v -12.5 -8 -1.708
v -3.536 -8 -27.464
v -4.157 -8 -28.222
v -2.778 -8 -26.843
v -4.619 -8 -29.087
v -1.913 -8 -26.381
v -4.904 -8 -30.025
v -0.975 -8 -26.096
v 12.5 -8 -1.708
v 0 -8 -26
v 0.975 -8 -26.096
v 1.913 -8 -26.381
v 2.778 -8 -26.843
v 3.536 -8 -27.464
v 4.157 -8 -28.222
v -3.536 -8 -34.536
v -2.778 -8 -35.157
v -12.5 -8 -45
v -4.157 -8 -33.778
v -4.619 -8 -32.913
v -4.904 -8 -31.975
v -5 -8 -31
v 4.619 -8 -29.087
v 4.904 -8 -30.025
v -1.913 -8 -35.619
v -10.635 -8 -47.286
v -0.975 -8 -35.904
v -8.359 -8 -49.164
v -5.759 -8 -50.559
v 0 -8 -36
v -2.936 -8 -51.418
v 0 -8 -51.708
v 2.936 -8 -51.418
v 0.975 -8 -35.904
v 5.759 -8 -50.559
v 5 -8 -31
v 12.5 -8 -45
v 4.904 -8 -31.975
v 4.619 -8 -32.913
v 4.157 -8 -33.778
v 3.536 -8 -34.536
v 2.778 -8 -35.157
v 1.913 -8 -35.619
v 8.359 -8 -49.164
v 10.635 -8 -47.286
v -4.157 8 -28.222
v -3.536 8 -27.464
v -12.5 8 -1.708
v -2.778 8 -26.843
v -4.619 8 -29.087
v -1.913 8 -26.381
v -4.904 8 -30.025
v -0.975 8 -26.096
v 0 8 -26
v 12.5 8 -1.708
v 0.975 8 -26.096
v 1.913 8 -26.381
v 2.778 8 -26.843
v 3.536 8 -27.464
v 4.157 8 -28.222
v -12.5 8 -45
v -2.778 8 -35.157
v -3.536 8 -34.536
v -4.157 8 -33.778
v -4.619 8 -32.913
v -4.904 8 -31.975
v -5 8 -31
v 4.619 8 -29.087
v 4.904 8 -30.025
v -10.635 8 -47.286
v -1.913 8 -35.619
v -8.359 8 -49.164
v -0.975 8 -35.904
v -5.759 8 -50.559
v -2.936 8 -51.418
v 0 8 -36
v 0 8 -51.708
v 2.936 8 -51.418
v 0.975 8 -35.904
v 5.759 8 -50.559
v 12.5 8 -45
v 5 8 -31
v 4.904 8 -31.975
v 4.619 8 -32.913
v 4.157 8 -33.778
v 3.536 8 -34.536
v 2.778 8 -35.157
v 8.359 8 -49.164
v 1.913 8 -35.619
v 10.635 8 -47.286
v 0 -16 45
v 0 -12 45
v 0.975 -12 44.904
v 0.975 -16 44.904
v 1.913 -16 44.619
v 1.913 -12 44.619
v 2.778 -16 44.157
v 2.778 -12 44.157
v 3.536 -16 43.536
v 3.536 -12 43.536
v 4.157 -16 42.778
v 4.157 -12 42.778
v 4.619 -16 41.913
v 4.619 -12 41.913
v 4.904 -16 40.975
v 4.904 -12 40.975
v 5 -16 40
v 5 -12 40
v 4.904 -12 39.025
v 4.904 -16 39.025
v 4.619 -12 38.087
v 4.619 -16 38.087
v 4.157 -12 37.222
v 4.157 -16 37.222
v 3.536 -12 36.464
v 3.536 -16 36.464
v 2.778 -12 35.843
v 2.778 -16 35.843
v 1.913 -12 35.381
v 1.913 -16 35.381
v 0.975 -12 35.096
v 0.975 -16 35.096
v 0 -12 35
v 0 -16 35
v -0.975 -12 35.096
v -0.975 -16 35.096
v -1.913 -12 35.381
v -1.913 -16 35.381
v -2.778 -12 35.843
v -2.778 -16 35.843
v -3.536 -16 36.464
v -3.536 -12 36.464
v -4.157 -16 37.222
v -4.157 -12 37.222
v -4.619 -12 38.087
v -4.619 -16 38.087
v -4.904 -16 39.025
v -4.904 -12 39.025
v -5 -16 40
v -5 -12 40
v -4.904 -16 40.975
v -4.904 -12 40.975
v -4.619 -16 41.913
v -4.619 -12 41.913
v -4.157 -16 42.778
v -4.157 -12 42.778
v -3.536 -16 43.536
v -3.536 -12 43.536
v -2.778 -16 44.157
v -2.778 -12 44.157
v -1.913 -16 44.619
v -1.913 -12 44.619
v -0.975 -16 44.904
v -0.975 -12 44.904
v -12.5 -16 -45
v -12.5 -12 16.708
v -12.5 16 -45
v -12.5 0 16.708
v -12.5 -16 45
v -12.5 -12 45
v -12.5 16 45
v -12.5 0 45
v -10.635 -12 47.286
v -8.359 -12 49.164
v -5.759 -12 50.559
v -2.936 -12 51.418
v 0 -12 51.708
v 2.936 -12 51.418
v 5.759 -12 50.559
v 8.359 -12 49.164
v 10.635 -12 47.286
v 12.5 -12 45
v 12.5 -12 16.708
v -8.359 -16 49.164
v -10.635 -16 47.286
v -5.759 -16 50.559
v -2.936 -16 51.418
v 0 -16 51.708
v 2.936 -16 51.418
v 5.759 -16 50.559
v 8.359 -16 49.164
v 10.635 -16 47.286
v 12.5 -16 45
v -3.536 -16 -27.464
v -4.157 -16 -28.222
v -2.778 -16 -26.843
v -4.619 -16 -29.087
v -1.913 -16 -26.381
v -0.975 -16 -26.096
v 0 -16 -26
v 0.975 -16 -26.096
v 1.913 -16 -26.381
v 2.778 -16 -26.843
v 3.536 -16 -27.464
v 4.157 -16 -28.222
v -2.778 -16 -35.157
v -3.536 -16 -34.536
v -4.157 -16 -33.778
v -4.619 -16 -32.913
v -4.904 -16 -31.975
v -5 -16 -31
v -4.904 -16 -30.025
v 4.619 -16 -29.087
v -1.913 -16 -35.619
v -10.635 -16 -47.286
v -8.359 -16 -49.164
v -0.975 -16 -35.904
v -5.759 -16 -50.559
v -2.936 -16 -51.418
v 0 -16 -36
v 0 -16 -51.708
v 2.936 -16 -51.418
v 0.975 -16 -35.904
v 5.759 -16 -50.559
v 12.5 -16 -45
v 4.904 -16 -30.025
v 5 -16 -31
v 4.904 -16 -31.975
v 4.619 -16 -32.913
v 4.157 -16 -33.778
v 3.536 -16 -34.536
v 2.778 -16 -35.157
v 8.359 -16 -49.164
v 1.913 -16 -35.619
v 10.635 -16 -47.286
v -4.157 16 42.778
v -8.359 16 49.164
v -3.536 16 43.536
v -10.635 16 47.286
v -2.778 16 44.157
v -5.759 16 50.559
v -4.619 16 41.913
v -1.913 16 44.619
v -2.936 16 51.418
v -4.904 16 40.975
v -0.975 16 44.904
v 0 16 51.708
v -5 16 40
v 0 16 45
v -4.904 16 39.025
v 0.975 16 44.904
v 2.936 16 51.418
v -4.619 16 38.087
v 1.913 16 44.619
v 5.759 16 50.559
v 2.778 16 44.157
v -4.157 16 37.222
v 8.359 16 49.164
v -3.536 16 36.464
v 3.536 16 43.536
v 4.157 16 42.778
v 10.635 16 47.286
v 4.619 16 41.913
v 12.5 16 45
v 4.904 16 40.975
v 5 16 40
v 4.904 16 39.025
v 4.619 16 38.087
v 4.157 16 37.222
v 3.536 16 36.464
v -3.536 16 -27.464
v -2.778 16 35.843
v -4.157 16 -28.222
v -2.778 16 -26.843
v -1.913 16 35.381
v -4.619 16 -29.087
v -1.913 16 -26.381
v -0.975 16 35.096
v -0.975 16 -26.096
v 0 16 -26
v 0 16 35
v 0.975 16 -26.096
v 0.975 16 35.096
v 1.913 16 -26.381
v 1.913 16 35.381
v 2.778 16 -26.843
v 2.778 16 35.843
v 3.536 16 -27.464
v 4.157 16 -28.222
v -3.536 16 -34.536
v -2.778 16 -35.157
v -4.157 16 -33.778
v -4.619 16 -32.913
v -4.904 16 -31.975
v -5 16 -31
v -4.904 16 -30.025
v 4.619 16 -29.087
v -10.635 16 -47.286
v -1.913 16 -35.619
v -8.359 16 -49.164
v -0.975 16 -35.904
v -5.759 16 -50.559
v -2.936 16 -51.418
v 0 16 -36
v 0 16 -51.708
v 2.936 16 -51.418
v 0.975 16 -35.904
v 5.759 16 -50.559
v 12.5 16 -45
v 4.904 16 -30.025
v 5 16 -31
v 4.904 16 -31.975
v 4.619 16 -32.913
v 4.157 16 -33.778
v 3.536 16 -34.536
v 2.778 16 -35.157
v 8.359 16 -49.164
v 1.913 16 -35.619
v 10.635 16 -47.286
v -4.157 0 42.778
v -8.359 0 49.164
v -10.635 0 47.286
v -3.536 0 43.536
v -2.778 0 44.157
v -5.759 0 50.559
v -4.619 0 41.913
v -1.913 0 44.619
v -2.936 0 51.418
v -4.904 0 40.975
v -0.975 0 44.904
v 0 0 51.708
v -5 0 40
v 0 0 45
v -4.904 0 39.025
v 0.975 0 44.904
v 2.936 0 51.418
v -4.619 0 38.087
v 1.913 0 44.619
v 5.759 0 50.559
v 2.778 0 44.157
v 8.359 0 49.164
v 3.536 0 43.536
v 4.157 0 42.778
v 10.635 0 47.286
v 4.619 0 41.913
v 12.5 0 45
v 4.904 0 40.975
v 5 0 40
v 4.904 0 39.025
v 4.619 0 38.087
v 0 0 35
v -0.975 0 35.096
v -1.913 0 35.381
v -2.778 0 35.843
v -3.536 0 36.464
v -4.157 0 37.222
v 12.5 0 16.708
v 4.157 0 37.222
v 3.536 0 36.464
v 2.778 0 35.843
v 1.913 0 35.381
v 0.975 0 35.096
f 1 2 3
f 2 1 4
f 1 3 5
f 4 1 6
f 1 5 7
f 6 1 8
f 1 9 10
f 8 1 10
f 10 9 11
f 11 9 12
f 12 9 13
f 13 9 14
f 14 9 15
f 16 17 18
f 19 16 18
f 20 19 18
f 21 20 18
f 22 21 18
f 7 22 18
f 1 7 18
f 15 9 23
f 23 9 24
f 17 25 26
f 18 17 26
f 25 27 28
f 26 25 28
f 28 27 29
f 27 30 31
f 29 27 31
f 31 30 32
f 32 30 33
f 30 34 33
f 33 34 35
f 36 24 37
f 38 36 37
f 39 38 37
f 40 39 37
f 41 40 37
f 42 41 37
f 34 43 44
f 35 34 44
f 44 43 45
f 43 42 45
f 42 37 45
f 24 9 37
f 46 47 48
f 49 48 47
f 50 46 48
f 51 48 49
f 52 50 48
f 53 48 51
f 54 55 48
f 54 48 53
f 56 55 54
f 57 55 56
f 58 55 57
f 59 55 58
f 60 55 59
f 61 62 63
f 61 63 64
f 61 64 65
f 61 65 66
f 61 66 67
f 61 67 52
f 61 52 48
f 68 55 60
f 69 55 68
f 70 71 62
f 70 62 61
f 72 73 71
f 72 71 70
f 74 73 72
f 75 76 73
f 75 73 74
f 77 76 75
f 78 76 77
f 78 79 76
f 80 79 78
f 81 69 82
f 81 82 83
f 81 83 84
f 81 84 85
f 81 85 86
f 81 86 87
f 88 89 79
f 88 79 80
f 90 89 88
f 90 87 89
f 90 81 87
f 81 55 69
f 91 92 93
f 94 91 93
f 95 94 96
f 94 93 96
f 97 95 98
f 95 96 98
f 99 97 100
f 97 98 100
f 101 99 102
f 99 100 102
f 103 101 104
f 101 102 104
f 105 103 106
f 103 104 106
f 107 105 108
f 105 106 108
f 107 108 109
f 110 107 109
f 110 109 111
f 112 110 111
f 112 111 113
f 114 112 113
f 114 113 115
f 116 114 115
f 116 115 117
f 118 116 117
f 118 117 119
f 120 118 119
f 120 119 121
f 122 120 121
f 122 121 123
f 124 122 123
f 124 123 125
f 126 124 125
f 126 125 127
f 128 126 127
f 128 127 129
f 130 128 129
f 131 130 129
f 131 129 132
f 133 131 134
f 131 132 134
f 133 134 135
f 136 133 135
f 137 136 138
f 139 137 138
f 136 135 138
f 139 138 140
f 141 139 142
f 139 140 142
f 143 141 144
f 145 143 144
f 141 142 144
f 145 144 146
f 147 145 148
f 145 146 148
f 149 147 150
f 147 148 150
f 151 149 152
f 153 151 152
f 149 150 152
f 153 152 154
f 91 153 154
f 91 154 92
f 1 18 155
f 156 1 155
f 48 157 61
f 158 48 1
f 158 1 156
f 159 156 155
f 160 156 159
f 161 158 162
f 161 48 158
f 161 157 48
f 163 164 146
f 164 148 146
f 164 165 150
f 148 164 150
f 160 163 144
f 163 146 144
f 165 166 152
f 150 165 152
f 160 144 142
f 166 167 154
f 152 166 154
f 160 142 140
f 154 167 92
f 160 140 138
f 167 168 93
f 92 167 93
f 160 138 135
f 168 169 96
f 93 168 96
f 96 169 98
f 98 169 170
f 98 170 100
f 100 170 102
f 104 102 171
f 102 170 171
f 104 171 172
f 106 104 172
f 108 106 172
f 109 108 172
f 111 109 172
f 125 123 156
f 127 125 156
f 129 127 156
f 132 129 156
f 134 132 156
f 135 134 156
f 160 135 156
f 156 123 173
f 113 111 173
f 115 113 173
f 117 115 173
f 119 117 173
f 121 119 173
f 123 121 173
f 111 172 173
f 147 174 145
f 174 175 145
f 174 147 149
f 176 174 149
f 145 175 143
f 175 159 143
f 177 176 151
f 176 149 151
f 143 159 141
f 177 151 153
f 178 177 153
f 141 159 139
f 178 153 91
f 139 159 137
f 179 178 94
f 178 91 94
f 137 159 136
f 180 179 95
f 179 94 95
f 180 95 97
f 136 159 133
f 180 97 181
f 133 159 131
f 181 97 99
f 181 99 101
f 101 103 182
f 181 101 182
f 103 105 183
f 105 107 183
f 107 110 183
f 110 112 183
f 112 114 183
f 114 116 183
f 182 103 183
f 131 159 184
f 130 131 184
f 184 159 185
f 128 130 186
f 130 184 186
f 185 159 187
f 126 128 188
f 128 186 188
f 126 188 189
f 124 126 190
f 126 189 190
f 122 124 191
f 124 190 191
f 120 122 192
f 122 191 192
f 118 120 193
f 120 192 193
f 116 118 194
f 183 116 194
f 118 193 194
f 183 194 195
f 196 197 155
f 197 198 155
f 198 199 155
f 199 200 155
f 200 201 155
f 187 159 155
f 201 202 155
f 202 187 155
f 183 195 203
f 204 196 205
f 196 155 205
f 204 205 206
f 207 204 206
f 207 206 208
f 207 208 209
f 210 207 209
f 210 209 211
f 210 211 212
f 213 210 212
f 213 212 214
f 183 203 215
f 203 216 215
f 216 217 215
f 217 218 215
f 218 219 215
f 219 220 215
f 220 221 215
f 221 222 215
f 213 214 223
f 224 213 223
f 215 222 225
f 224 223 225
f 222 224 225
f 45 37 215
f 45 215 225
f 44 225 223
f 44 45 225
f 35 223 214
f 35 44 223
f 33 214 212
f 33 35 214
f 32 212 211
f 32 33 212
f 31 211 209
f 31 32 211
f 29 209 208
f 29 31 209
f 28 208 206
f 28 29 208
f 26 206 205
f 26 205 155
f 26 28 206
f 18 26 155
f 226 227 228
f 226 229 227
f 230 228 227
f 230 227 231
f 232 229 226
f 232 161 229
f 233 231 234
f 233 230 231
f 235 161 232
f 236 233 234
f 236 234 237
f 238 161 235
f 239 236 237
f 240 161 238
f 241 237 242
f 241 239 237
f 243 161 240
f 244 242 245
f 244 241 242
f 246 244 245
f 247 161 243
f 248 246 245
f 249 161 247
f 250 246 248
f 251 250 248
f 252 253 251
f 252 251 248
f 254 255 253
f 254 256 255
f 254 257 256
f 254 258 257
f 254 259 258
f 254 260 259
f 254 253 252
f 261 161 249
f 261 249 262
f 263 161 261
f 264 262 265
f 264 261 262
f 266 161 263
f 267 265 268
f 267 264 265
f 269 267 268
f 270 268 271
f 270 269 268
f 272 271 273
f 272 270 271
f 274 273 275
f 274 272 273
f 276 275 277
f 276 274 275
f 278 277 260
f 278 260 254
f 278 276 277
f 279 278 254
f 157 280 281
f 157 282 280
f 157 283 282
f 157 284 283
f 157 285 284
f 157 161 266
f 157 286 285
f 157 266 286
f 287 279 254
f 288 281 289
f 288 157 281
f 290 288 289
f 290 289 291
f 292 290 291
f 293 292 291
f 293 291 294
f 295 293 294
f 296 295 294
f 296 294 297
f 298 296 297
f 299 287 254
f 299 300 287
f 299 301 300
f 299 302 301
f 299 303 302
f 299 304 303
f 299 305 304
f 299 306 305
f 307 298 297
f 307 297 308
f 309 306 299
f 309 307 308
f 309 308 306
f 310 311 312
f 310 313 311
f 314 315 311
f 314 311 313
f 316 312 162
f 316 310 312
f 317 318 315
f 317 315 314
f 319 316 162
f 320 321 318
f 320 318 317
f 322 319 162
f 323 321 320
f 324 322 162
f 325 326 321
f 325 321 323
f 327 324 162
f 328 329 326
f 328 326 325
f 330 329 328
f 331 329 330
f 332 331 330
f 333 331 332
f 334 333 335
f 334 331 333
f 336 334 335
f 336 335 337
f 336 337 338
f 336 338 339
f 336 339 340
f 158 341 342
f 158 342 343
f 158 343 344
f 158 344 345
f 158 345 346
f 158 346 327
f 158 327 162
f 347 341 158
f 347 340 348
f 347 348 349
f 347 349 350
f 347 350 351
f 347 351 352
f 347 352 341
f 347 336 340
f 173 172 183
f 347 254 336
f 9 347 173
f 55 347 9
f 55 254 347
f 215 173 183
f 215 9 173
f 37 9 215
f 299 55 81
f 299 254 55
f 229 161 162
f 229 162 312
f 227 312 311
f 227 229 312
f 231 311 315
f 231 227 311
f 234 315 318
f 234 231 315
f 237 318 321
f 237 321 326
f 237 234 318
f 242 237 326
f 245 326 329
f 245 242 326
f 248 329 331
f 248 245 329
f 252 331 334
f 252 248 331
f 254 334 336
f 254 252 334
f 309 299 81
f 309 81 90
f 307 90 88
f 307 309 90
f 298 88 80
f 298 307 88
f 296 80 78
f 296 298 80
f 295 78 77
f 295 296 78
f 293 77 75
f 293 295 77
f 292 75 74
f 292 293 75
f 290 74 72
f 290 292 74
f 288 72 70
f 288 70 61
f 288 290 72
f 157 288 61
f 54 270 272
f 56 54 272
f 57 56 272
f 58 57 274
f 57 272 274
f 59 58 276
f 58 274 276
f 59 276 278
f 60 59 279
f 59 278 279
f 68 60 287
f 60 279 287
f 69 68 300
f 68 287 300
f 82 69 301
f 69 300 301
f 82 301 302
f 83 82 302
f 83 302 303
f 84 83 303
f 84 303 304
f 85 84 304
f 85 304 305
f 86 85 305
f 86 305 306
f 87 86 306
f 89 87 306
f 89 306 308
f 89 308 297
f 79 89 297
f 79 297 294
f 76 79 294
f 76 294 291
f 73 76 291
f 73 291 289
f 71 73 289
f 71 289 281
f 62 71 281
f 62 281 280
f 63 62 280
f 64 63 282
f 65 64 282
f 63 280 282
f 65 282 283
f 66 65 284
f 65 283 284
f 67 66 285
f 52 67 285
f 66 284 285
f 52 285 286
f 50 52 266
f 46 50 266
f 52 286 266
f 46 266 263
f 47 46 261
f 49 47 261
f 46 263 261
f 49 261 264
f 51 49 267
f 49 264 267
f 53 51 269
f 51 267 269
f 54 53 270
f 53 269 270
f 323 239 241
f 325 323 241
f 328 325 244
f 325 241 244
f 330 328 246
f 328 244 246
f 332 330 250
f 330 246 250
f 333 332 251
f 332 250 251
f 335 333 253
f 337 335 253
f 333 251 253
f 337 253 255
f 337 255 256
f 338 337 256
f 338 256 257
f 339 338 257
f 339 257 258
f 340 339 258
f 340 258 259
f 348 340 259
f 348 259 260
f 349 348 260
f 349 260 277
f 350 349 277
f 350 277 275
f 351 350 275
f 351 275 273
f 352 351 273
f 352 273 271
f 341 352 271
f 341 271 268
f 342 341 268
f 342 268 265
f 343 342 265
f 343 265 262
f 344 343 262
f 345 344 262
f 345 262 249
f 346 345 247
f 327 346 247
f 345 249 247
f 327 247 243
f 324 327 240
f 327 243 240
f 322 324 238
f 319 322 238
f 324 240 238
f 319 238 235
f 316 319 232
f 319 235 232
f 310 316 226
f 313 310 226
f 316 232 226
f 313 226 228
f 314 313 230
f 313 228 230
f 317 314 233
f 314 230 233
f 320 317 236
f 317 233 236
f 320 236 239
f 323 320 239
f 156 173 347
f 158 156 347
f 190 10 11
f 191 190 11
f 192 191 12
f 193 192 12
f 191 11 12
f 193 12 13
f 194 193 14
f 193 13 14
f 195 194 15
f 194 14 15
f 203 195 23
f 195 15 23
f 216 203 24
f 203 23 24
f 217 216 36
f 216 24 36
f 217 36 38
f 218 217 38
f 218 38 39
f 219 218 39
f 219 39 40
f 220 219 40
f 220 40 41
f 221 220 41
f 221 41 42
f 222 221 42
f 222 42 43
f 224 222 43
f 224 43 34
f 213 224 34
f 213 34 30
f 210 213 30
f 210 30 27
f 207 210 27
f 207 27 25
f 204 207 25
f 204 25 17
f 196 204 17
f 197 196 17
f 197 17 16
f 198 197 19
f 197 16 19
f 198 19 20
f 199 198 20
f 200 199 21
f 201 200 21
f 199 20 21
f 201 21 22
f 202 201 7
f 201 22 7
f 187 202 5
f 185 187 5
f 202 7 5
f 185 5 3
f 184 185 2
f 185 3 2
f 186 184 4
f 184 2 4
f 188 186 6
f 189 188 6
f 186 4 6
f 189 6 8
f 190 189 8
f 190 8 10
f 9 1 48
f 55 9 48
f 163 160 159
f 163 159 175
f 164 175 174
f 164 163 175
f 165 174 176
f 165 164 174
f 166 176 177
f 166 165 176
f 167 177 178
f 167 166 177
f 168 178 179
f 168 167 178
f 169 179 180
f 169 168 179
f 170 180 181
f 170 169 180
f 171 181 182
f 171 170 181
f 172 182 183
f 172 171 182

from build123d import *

# Parameters (mm, degrees)
EXTRUDE_1_DEPTH     = 16
SKETCH_2_W          = 56.583123952
SKETCH_2_H          = 12
CUT_EXTRUDE_1_DEPTH = 60.621829584
SKETCH_3_W          = 86.583123952
SKETCH_3_H          = 16
CUT_EXTRUDE_2_DEPTH = 60.621829584
SKETCH_4_R          = 5
CUT_EXTRUDE_3_DEPTH = 63.080693963


with BuildPart() as part:
    # 草图1 → 凸台-拉伸1 (new, symmetric)
    with BuildSketch(Plane(origin=(0, 0, 0), x_dir=(1, 0, 0), z_dir=(0, 1, 0))):
        with BuildLine():
            Line((-12.5, 45), (-12.5, -45))
            ThreePointArc((-12.5, -45), (0, -51.708438024), (12.5, -45))
            Line((12.5, -45), (12.5, 45))
            ThreePointArc((12.5, 45), (0, 51.708438024), (-12.5, 45))
        make_face()
    extrude(amount=EXTRUDE_1_DEPTH, both=True)

    # 草图2 → 切除-拉伸1 (cut, through all)
    with BuildSketch(Plane(origin=(12.5, 0, 0), x_dir=(0, 0, -1), z_dir=(1, 0, 0))):
        with Locations((-45, -6)):
            Rectangle(SKETCH_2_W, SKETCH_2_H)
    extrude(amount=-CUT_EXTRUDE_1_DEPTH, mode=Mode.SUBTRACT)

    # 草图3 → 切除-拉伸2 (cut, through all)
    with BuildSketch(Plane(origin=(12.5, 0, 0), x_dir=(0, 0, -1), z_dir=(1, 0, 0))):
        with Locations((45, 0)):
            Rectangle(SKETCH_3_W, SKETCH_3_H)
    extrude(amount=-CUT_EXTRUDE_2_DEPTH, mode=Mode.SUBTRACT)

    # 草图4 → 切除-拉伸3 (cut, through all)
    with BuildSketch(Plane(origin=(0, 16, 0), x_dir=(1, 0, 0), z_dir=(0, 1, 0))):
        with Locations(Location((0, -40, 0), (0, 0, 270))):
            Circle(SKETCH_4_R)
        with Locations(Location((0, 31, 0), (0, 0, 270))):
            Circle(SKETCH_4_R)
    extrude(amount=-CUT_EXTRUDE_3_DEPTH, mode=Mode.SUBTRACT)


solid = part.part
